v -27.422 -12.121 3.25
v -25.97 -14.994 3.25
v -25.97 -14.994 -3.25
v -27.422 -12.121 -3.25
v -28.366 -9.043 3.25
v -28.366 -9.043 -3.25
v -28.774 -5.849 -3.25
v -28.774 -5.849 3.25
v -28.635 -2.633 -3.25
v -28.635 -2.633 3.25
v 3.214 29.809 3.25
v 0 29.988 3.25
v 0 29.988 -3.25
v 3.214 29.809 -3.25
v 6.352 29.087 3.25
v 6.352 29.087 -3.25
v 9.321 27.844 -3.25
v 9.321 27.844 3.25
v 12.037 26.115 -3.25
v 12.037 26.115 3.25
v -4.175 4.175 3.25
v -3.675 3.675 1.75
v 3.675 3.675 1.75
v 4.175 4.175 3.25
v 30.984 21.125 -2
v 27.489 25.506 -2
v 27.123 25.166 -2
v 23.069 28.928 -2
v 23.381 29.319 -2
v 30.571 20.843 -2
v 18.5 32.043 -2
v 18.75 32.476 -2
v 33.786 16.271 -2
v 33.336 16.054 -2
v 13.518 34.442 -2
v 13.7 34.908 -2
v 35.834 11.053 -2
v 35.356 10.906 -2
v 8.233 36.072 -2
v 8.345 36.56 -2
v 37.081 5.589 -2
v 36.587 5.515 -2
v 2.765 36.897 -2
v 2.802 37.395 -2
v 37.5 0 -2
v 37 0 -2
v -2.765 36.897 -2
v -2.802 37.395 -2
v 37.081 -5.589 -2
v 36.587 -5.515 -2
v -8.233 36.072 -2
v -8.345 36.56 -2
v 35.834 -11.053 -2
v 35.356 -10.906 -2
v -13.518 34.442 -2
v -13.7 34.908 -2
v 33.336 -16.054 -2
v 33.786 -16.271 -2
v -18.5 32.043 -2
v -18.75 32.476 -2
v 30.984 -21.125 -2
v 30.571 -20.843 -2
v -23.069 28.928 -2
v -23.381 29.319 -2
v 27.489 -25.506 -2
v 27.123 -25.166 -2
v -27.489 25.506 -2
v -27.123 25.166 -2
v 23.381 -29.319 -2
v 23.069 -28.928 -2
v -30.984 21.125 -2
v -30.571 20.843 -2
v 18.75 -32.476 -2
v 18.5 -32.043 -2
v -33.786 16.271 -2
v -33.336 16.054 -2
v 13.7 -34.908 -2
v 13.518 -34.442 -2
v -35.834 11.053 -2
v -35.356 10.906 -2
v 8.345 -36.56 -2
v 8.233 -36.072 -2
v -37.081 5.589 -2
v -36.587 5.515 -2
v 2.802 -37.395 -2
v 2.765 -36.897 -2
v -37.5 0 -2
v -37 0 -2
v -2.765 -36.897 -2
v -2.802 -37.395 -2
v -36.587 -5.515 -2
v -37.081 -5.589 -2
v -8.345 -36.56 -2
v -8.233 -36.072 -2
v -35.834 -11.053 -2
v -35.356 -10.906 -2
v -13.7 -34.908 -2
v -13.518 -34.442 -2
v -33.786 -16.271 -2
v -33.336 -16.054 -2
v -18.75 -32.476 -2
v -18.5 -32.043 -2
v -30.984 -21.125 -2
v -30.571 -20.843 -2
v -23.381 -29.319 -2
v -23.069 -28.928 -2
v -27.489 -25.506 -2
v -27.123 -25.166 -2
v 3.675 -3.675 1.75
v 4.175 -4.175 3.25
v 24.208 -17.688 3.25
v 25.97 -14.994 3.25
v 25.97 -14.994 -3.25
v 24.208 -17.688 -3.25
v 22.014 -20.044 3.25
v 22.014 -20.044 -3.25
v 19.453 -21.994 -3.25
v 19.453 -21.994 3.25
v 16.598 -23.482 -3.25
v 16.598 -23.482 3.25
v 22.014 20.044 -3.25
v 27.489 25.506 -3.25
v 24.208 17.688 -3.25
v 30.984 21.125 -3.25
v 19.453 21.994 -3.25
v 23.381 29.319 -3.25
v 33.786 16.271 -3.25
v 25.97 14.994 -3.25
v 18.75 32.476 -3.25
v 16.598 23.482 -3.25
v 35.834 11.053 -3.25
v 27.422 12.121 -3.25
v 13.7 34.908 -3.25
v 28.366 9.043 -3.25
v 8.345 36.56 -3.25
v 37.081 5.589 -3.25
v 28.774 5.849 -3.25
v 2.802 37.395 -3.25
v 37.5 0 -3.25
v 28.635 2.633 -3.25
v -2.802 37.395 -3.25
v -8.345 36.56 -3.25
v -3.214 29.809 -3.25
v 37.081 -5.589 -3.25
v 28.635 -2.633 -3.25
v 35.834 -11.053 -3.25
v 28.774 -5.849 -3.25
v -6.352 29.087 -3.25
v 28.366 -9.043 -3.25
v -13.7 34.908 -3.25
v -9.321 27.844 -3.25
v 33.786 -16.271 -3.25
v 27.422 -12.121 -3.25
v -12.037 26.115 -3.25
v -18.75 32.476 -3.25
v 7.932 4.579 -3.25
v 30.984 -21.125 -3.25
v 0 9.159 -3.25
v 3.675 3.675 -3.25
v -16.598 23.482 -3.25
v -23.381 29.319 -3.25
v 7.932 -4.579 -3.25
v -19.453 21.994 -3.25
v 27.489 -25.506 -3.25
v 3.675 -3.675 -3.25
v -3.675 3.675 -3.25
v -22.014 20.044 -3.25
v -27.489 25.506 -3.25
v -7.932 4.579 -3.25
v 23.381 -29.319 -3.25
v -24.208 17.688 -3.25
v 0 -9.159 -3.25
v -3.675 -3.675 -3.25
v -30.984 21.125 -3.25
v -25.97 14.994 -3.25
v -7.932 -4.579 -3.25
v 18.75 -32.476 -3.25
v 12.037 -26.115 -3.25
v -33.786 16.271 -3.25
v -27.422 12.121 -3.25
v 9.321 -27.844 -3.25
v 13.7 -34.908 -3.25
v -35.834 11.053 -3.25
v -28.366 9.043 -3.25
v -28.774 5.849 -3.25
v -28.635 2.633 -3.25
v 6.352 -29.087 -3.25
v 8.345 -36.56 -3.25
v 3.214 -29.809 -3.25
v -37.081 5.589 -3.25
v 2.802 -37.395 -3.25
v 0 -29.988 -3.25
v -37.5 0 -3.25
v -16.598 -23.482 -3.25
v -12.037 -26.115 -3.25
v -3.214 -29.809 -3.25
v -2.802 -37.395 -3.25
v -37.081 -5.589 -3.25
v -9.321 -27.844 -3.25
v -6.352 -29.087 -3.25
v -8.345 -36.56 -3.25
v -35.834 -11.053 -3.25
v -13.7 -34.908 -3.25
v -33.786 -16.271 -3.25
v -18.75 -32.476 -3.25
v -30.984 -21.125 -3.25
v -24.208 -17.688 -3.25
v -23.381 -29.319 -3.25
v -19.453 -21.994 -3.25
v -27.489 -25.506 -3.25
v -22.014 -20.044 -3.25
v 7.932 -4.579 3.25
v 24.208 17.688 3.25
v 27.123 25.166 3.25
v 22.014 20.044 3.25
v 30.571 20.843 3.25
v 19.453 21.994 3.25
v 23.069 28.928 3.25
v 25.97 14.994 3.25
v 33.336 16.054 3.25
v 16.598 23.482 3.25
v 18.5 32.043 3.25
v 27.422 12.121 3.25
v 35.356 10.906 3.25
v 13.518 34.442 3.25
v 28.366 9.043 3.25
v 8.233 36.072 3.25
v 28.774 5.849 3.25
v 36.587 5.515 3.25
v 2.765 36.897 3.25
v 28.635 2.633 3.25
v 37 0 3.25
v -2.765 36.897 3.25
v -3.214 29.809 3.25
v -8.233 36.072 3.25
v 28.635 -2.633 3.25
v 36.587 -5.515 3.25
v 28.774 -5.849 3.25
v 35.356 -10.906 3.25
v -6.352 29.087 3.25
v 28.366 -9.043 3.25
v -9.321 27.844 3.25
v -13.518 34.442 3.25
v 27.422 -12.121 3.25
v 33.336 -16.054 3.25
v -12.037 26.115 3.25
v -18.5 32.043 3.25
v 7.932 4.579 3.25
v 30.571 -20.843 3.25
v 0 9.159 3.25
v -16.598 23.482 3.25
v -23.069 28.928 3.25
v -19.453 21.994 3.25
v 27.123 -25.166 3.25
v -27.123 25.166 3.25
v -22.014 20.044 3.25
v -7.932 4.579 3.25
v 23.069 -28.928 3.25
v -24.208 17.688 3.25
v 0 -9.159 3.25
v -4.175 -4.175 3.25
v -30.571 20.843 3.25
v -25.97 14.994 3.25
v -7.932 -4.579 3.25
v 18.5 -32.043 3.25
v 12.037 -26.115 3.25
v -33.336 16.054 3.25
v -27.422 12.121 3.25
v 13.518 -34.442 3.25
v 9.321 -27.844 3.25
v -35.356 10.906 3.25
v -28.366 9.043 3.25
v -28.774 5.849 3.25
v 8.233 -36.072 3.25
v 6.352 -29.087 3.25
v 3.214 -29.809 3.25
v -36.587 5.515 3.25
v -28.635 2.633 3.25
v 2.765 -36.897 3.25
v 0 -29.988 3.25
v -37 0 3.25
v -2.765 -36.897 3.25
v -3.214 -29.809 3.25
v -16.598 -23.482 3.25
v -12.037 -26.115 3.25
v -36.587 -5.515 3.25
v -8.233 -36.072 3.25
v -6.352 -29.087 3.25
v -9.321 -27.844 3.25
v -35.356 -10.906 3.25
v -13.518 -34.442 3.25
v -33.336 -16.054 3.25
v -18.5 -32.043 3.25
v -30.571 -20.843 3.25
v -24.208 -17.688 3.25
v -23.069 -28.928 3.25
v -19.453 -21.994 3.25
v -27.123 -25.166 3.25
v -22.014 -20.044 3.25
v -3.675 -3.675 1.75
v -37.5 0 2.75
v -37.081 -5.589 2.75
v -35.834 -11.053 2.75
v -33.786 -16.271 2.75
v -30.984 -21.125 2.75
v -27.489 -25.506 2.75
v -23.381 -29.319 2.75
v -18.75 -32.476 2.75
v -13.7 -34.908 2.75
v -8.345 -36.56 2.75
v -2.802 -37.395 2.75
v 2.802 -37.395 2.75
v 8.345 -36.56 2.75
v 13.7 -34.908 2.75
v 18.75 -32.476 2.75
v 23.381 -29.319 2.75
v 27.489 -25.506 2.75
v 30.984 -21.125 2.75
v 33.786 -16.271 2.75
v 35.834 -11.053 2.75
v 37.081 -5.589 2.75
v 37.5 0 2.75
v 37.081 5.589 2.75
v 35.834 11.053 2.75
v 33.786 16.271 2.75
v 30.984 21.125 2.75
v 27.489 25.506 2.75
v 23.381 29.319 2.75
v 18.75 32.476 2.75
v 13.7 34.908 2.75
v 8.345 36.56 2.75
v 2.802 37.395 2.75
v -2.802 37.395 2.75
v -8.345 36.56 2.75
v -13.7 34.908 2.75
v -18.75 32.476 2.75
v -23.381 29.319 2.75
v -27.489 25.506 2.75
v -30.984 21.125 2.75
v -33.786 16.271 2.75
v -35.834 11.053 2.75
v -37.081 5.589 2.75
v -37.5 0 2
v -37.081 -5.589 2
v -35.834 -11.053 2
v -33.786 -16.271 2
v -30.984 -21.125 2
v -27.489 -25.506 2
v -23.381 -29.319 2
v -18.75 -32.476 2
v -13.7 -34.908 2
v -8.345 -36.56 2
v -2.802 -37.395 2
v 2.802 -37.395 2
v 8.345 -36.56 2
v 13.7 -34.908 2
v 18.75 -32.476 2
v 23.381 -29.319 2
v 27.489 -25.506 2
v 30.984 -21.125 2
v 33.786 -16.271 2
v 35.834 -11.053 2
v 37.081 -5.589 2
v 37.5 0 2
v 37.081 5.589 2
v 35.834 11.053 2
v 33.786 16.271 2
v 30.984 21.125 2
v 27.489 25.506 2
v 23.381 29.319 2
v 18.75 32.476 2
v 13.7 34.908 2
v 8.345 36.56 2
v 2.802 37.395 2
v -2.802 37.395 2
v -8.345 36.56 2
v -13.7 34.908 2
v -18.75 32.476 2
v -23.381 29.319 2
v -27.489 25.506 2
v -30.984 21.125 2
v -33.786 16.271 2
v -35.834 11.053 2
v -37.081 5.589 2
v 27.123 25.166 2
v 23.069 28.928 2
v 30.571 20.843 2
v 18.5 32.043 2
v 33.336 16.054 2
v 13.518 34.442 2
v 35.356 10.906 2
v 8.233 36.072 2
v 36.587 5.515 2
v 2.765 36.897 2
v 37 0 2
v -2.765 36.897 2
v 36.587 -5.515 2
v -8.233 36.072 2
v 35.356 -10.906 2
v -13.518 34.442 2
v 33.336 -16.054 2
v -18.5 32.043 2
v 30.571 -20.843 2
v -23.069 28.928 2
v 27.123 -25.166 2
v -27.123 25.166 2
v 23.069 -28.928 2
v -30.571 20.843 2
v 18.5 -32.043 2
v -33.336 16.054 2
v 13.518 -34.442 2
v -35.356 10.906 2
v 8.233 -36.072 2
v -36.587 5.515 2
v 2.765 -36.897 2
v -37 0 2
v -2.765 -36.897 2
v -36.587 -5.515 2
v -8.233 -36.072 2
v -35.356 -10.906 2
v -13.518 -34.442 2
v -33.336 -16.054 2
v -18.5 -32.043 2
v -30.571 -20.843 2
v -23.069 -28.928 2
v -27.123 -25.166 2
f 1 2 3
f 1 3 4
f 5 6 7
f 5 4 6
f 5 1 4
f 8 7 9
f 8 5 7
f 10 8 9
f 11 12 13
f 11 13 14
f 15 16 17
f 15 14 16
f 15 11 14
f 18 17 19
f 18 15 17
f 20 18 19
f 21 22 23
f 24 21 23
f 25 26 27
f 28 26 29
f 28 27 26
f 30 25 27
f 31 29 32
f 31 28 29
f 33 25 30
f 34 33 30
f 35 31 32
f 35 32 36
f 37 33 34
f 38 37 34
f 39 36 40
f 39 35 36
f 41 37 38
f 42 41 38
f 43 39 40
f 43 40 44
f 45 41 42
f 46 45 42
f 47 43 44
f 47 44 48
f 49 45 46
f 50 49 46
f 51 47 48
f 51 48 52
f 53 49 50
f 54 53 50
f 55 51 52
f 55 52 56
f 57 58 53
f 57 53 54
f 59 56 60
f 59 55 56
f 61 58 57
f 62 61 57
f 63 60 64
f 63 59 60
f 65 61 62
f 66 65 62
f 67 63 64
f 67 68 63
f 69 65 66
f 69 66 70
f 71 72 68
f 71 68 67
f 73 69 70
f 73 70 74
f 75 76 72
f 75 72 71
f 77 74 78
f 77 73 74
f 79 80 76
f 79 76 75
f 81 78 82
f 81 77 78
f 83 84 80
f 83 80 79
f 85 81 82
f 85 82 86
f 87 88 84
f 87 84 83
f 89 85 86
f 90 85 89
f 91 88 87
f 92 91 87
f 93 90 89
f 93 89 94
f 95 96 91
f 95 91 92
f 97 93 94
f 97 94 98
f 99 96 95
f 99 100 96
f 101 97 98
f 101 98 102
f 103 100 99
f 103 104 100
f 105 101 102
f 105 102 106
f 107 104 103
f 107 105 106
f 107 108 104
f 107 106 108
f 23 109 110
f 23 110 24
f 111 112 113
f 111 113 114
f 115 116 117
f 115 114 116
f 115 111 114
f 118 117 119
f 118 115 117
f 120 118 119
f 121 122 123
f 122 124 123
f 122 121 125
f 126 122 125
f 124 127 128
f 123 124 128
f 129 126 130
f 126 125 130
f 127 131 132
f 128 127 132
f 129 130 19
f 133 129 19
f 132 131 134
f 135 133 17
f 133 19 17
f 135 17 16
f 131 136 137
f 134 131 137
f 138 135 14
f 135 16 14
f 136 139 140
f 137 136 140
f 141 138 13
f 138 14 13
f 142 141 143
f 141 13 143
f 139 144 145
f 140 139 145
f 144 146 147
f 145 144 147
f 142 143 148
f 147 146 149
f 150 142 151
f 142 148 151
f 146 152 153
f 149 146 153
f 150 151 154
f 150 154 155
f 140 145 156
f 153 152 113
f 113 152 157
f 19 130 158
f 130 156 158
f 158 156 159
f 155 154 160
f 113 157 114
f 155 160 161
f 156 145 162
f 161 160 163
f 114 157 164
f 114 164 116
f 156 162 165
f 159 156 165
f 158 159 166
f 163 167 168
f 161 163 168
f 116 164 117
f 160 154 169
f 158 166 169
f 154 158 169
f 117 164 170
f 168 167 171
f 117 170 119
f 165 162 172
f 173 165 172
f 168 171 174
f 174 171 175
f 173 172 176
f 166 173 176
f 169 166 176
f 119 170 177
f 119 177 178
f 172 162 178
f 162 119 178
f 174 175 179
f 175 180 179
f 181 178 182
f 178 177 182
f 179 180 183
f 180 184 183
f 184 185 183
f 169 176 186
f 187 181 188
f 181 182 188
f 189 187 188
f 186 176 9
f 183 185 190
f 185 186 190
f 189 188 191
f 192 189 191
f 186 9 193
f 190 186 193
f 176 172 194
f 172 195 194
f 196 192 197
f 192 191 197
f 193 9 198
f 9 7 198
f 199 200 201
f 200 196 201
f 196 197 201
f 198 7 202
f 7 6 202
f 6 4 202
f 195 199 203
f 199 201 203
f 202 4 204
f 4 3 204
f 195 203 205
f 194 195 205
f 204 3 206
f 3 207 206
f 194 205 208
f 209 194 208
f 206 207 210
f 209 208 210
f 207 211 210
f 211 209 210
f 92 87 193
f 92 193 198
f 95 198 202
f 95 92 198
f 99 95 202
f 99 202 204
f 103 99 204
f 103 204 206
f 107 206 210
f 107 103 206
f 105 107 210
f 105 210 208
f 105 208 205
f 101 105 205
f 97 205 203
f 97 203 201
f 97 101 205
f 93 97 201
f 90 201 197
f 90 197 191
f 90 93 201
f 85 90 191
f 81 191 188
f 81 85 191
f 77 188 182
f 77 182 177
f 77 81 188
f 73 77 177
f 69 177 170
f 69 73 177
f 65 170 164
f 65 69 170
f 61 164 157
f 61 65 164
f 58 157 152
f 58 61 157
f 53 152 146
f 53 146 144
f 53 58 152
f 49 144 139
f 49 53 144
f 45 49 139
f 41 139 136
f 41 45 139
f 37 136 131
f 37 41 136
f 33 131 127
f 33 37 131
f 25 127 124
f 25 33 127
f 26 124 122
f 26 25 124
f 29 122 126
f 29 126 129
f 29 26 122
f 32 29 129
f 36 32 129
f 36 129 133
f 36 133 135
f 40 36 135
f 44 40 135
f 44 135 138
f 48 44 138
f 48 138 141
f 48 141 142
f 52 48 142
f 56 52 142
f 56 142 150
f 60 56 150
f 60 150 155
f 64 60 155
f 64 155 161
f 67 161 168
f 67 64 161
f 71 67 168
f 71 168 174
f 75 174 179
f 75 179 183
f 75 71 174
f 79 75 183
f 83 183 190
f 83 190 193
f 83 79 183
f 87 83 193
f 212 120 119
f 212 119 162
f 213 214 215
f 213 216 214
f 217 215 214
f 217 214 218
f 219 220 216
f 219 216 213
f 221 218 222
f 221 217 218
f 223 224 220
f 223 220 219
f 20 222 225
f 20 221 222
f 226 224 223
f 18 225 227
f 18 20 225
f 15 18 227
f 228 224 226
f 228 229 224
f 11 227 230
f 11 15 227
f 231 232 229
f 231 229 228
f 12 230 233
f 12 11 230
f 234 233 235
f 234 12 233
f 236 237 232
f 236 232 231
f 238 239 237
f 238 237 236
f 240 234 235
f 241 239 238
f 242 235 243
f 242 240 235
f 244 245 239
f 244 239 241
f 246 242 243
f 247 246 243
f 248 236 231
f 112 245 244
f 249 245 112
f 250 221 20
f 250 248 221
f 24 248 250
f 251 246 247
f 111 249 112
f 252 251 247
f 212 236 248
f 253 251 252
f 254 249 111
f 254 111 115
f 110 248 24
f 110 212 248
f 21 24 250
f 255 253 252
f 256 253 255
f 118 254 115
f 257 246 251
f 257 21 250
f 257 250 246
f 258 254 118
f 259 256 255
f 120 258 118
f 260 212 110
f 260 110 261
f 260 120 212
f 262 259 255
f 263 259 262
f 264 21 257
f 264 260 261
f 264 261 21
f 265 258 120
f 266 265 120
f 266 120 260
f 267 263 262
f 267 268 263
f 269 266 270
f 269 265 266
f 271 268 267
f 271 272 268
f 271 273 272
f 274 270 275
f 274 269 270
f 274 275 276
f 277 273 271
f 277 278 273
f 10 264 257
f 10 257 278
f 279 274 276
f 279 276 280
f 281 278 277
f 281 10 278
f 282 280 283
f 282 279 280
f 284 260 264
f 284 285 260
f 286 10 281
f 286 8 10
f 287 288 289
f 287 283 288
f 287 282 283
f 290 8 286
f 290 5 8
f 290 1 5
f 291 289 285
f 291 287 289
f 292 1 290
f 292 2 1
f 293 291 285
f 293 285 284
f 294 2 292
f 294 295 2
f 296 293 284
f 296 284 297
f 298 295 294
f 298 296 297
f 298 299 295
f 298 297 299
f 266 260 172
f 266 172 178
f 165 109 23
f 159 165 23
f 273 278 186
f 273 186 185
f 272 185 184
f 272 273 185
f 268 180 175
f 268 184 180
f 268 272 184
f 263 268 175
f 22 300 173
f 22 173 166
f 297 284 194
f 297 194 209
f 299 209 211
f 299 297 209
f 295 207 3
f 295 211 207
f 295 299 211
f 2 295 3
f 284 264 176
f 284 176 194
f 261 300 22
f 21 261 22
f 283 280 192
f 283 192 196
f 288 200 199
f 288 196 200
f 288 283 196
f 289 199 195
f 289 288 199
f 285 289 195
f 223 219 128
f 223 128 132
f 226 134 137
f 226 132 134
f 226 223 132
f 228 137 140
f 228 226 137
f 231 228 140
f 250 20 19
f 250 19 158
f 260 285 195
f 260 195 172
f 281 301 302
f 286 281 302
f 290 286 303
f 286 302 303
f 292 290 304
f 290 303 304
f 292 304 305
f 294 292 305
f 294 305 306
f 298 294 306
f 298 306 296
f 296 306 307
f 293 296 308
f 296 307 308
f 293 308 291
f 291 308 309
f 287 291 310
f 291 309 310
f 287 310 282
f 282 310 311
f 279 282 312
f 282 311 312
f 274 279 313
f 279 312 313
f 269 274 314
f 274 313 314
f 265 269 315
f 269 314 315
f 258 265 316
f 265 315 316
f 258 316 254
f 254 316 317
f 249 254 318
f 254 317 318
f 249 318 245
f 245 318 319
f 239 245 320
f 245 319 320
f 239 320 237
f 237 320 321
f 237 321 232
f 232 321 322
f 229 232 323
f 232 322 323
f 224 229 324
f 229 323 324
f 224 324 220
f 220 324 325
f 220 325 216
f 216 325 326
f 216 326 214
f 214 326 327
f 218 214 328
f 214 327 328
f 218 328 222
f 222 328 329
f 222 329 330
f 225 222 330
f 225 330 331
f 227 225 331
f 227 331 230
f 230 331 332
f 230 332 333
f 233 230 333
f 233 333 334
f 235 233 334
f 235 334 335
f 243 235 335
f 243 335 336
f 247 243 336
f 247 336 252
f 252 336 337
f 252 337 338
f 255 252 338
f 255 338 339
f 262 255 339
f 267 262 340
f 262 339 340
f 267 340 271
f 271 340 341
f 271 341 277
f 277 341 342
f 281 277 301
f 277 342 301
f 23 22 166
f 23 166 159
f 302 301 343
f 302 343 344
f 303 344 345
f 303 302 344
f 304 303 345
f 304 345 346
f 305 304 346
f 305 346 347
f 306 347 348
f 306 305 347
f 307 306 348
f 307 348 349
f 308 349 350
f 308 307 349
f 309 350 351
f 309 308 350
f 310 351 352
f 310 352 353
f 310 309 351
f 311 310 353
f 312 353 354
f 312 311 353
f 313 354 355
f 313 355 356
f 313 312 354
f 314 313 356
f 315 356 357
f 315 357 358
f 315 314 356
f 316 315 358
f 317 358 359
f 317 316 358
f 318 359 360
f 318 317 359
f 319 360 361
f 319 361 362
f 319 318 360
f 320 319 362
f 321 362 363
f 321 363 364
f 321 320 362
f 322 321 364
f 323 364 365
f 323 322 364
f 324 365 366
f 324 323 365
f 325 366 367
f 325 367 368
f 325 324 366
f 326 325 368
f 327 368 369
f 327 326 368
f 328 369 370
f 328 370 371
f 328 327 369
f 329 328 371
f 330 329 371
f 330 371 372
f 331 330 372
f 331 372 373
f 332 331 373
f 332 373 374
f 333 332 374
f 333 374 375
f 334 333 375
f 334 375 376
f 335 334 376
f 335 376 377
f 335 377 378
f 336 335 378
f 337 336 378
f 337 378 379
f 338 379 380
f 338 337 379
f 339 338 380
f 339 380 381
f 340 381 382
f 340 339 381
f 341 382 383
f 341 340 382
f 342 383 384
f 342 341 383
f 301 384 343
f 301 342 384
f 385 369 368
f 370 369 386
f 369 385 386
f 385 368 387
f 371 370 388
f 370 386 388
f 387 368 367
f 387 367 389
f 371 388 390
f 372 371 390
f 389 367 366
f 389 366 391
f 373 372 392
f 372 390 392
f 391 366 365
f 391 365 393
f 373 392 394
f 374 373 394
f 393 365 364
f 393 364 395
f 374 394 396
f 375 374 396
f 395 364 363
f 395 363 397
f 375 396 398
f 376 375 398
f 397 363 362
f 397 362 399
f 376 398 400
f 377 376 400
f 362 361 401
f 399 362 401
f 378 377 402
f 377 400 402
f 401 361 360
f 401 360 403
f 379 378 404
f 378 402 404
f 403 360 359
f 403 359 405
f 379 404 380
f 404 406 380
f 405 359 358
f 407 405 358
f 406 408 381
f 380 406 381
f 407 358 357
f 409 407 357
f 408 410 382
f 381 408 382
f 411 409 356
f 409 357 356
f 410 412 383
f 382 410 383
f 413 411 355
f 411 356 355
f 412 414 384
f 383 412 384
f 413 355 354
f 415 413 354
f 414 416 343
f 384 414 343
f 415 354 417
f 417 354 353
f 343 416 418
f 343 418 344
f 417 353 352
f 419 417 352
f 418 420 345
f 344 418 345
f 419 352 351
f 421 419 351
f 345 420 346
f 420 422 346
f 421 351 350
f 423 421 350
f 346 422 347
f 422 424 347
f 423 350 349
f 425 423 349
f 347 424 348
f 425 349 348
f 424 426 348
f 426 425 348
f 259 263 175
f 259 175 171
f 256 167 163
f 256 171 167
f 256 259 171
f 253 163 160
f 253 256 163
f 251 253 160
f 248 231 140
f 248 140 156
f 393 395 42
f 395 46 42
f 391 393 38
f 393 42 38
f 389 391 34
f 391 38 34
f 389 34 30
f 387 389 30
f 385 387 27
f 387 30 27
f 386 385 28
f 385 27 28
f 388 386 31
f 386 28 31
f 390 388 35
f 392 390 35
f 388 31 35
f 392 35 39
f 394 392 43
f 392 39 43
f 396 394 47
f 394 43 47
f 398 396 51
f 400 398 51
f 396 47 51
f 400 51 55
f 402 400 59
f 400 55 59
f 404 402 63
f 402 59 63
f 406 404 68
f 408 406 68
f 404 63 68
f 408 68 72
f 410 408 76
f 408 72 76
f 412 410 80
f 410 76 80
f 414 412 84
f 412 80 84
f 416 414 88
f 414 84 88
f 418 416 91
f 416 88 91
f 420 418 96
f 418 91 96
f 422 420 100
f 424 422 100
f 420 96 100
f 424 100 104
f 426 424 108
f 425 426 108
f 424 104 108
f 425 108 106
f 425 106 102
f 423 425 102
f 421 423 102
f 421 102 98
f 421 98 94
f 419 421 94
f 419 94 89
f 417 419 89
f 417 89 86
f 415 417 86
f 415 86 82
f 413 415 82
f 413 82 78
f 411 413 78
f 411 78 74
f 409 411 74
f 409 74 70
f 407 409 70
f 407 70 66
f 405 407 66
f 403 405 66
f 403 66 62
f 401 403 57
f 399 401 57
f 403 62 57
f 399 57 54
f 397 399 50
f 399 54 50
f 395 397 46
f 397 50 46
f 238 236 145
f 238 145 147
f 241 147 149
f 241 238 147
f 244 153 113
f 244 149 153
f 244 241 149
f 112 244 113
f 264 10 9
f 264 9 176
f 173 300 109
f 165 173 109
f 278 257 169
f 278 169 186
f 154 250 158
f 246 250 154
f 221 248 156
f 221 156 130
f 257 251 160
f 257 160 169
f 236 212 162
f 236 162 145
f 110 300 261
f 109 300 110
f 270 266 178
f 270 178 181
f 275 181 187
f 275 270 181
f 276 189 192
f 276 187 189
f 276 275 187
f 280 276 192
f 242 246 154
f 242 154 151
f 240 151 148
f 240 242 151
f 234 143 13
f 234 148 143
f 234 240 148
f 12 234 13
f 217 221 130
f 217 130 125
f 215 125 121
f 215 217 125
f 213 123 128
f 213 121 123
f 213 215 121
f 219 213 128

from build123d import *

# Parameters (mm, degrees)
SKETCH1_R           = 37.5
SKETCH1_W           = 7.35
SKETCH1_H           = 7.35
BOSS_EXTRUDE1_DEPTH = 3.25
CUT_EXTRUDE1_DEPTH  = 4
CIRPATTERN1_COUNT   = 6
SKETCH3_R           = 37.5
SKETCH3_R_2         = 37
CUT_EXTRUDE2_DEPTH  = 2
CHAMFER1_SIZE       = 0.5
CHAMFER1_SIZE2      = 1.5
CHAMFER2_SIZE       = 0.5


with BuildPart() as part:
    # Sketch1 → Boss-Extrude1 (new, symmetric)
    with BuildSketch(Plane.XY):
        with Locations(Location((0, 0, 0), (0, 0, 180))):
            Circle(SKETCH1_R)
        Rectangle(SKETCH1_W, SKETCH1_H, mode=Mode.SUBTRACT)
    extrude(amount=BOSS_EXTRUDE1_DEPTH, both=True)

    # Sketch2 → Cut-Extrude1 (cut, symmetric)
    with BuildSketch(Plane.XY):
        with BuildLine():
            Line((0, 9.158641407), (-12.037071564, 26.115211784))
            ThreePointArc((-12.037071564, 26.115211784), (-6.351662121, 29.087034336), (0, 29.988143709))
            ThreePointArc((0, 29.988143709), (6.351662121, 29.087034336), (12.037071564, 26.115211784))
            Line((12.037071564, 26.115211784), (0, 9.158641407))
        make_face()
    cut_extrude1 = extrude(amount=CUT_EXTRUDE1_DEPTH, both=True, mode=Mode.SUBTRACT)

    # CirPattern1: Cut-Extrude1 ×6 about axis
    cirpattern1_axis = Axis((0, 0, 0), (0, 0, 1))
    for i in range(1, CIRPATTERN1_COUNT):
        add(cut_extrude1.rotate(cirpattern1_axis, i * 360 / CIRPATTERN1_COUNT), mode=Mode.SUBTRACT)

    # Sketch3 → Cut-Extrude2 (cut, symmetric)
    with BuildSketch(Plane.XY):
        with Locations(Location((0, 0, 0), (0, 0, 180))):
            Circle(SKETCH3_R)
        Circle(SKETCH3_R_2, mode=Mode.SUBTRACT)
    extrude(amount=CUT_EXTRUDE2_DEPTH, both=True, mode=Mode.SUBTRACT)

    # Chamfer1
    chamfer1_edges = [part.edges().sort_by_distance(p)[0] for p in [
        (3.675, 0, 3.25),
        (0, 3.675, 3.25),
        (-3.675, 0, 3.25),
        (0, -3.675, 3.25),
    ]]
    chamfer1_side = [part.faces().sort_by_distance(p)[0] for p in [
        (36.439339828, 0, 3.25),
    ]]
    chamfer(chamfer1_edges, length=CHAMFER1_SIZE, length2=CHAMFER1_SIZE2, reference=chamfer1_side[0])

    # Chamfer2
    chamfer2_edges = [part.edges().sort_by_distance(p)[0] for p in [
        (37.5, 0, 3.25),
    ]]
    chamfer(chamfer2_edges, length=CHAMFER2_SIZE)


solid = part.part
